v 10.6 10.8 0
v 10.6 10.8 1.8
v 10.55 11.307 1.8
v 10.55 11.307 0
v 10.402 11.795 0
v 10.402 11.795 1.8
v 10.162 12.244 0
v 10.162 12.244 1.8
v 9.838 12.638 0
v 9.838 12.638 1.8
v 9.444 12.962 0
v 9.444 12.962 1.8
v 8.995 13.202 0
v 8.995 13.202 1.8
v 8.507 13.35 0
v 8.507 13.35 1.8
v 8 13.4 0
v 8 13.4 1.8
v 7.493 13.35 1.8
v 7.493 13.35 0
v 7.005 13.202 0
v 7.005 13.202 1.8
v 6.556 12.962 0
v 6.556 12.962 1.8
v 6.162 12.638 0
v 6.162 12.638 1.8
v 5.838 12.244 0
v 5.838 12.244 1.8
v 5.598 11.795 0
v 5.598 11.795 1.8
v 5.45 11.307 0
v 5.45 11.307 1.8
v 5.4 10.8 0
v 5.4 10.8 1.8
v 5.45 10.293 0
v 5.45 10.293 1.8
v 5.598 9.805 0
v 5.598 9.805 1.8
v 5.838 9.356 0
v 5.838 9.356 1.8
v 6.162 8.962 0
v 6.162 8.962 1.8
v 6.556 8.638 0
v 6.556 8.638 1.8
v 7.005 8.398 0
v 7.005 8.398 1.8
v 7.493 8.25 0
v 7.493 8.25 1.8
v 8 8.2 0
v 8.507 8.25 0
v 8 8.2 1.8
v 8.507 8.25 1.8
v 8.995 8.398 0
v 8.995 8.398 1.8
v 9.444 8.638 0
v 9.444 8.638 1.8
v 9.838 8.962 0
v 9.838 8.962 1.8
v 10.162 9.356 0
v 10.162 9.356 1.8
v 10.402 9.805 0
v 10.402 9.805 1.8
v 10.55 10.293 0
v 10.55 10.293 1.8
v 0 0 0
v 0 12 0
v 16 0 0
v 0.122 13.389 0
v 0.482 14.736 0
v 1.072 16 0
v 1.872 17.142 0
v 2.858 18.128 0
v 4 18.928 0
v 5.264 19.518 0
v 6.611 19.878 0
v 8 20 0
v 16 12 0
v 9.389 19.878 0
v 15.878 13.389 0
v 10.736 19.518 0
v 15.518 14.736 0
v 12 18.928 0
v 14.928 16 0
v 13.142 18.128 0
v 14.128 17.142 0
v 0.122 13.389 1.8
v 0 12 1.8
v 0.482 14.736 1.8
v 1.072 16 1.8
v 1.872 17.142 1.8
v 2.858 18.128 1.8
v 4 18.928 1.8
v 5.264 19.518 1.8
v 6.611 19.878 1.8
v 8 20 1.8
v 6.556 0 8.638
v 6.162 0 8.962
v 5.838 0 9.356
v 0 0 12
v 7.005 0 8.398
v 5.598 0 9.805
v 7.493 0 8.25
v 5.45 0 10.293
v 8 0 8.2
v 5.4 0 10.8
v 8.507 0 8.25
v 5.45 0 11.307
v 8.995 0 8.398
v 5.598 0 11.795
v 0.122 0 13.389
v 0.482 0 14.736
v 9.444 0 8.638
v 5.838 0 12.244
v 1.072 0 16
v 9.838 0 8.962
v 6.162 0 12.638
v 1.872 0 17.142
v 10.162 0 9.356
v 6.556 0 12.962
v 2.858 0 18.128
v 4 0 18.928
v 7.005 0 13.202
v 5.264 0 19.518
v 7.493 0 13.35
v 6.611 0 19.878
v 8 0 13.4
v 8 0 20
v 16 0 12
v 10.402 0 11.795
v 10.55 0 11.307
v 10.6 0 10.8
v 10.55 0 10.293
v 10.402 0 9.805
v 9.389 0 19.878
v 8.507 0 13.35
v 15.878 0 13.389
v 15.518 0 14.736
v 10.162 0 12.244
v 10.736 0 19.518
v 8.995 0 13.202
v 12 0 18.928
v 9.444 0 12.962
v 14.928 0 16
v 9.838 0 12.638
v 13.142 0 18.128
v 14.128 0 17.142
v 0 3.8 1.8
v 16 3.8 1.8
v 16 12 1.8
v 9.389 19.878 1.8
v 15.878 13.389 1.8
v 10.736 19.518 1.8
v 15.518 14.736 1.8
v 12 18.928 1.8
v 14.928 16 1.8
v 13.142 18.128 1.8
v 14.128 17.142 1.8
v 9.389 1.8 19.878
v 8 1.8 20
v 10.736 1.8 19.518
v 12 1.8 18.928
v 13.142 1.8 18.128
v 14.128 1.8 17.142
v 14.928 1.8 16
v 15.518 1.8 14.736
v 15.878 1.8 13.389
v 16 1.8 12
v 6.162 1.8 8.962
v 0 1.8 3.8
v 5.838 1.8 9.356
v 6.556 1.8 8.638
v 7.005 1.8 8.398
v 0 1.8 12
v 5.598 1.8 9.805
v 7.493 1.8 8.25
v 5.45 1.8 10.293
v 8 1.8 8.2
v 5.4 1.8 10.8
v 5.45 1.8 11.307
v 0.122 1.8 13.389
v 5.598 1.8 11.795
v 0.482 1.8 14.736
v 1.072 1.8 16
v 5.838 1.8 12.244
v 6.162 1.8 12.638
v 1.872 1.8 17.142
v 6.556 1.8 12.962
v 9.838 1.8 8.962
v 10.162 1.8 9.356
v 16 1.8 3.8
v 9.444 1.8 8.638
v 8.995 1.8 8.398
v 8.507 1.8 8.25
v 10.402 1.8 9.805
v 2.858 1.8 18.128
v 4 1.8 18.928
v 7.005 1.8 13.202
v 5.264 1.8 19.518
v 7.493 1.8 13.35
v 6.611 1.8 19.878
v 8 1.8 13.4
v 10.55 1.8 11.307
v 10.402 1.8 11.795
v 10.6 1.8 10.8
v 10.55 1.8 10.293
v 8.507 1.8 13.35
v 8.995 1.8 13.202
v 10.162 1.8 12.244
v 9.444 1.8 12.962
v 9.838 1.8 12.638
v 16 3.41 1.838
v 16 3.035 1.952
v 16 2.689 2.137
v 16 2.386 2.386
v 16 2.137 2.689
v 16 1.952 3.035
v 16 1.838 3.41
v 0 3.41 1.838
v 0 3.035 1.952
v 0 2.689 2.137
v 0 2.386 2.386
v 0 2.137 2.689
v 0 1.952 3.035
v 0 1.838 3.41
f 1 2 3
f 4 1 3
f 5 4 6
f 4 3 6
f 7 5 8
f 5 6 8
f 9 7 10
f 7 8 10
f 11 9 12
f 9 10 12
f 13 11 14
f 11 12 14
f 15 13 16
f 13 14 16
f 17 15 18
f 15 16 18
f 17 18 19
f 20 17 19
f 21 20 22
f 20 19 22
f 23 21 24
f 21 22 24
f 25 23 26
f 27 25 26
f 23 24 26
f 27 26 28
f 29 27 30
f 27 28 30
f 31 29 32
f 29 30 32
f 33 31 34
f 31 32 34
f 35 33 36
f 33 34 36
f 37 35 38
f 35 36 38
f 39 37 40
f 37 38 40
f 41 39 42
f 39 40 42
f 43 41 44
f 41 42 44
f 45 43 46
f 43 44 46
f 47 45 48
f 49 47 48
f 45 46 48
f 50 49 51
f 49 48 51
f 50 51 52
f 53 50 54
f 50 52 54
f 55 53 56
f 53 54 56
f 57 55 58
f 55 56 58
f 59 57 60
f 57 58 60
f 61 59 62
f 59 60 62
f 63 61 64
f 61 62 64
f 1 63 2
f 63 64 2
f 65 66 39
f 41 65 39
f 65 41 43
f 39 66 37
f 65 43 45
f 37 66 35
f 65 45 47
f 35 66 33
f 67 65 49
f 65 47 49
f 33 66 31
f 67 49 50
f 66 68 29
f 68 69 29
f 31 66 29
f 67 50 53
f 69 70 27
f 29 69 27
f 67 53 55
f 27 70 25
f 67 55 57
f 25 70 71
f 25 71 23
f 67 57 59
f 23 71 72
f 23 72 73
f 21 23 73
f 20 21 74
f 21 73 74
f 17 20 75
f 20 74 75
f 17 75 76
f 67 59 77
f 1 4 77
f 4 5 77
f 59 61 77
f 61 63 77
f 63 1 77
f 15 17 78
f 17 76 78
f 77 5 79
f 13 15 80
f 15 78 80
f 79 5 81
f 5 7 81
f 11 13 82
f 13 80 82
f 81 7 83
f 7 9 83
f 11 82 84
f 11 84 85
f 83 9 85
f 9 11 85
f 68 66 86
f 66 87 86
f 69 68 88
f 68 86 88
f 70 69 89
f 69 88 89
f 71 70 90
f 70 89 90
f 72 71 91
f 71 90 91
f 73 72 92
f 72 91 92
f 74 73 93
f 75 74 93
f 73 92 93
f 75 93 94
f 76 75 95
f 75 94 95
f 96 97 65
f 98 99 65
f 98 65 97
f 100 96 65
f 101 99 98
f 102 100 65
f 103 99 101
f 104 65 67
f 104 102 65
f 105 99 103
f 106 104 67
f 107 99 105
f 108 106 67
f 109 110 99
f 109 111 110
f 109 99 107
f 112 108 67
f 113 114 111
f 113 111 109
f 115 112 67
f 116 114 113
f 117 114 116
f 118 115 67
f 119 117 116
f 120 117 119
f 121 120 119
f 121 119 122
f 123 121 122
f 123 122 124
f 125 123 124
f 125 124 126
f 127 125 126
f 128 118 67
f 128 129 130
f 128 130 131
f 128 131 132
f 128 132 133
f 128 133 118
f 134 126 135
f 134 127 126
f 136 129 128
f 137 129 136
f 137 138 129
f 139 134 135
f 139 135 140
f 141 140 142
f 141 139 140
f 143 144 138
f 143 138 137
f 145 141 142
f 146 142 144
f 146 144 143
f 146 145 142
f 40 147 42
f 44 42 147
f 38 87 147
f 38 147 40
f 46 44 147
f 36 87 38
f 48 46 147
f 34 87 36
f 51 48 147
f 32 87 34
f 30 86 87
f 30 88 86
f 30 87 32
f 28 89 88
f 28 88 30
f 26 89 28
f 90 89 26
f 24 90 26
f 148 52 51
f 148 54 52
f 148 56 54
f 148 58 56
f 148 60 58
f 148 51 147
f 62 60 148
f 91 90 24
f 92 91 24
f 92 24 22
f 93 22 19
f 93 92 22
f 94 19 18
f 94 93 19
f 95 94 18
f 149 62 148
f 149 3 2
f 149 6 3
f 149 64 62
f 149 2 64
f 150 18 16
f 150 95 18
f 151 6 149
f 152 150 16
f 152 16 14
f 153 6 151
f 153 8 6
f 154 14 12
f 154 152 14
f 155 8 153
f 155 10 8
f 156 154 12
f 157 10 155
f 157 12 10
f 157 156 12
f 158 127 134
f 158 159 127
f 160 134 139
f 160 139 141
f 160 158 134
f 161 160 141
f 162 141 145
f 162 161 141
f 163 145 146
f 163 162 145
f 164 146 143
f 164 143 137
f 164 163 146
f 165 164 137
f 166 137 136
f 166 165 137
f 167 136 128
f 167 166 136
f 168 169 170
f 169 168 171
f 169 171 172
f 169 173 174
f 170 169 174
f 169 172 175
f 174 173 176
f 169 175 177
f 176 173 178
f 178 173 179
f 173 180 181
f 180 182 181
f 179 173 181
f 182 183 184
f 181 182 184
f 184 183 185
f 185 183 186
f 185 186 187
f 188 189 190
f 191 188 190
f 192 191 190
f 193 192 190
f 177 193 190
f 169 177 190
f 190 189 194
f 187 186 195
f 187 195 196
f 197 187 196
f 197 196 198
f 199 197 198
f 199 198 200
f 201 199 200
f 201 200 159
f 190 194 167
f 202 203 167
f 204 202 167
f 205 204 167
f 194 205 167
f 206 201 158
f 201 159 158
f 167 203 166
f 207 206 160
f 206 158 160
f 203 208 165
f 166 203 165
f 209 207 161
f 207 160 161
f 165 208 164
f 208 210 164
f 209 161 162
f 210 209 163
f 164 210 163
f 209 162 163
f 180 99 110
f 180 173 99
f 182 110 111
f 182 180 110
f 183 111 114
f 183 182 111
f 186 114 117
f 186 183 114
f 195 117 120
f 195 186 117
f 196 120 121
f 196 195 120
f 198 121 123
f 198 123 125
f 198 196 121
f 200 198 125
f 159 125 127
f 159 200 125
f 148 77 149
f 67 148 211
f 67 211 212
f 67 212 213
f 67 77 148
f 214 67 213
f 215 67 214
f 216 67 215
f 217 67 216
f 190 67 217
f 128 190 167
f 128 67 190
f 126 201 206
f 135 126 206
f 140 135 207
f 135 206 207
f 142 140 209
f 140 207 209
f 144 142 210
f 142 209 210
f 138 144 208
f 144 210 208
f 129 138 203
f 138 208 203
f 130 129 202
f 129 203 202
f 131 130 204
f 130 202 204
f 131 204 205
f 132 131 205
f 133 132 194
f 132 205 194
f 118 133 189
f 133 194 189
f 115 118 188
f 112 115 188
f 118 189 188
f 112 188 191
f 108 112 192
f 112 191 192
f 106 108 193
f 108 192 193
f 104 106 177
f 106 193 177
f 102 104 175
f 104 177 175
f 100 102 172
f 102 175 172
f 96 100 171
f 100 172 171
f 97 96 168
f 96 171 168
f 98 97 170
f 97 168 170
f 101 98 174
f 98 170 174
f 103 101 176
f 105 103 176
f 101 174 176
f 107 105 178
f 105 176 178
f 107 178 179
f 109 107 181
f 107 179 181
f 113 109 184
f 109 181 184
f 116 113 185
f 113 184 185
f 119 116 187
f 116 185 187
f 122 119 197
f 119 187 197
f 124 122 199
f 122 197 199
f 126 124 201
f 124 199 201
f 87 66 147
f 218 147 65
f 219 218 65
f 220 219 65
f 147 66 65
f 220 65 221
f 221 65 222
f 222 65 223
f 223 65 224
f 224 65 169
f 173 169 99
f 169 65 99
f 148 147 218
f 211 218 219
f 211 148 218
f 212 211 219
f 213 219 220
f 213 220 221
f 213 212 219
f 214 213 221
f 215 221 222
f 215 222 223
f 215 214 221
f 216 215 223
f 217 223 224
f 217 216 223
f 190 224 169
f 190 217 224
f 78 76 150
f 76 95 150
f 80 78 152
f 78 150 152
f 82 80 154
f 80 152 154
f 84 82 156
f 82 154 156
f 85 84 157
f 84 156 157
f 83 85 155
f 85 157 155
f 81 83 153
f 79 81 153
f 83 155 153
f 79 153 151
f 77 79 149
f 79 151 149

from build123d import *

# Parameters (mm, degrees)
SKETCH1_W           = 16
SKETCH1_H           = 20
BOSS_EXTRUDE1_DEPTH = 1.8
SKETCH2_W           = 16
SKETCH2_H           = 18.2
BOSS_EXTRUDE2_DEPTH = 1.8
SKETCH3_R           = 2.6
CUT_EXTRUDE1_DEPTH  = 1.8
SKETCH4_R           = 2.6
CUT_EXTRUDE2_DEPTH  = 1.8
FILLET1_R           = 2
FILLET2_R           = 8


with BuildPart() as part:
    # Sketch1 → Boss-Extrude1 (new body)
    with BuildSketch(Plane.XY):
        with Locations((8, 10)):
            Rectangle(SKETCH1_W, SKETCH1_H)
    extrude(amount=BOSS_EXTRUDE1_DEPTH)

    # Sketch2 → Boss-Extrude2 (add)
    with BuildSketch(Plane.XZ):
        with Locations((8, 10.9)):
            Rectangle(SKETCH2_W, SKETCH2_H)
    extrude(amount=-BOSS_EXTRUDE2_DEPTH)

    # Sketch3 → Cut-Extrude1 (cut)
    with BuildSketch(Plane.XY.offset(1.8)):
        with Locations((8, 10.8)):
            Circle(SKETCH3_R)
    extrude(amount=-CUT_EXTRUDE1_DEPTH, mode=Mode.SUBTRACT)

    # Sketch4 → Cut-Extrude2 (cut)
    with BuildSketch(Plane(origin=(0, 1.8, 0), x_dir=(1, 0, 0), z_dir=(0, 1, 0))):
        with Locations(Location((8, -10.8, 0), (0, 0, 270))):
            Circle(SKETCH4_R)
    extrude(amount=-CUT_EXTRUDE2_DEPTH, mode=Mode.SUBTRACT)

    # Fillet1
    fillet1_edges = [part.edges().sort_by_distance(p)[0] for p in [
        (8, 1.8, 1.8),
    ]]
    fillet(fillet1_edges, radius=FILLET1_R)

    # Fillet2
    fillet2_edges = [part.edges().sort_by_distance(p)[0] for p in [
        (16, 0.9, 20),
        (0, 0.9, 20),
        (16, 20, 0.9),
        (0, 20, 0.9),
    ]]
    fillet(fillet2_edges, radius=FILLET2_R - 0.0001)  # a hair under: the kernel refuses the full size


solid = part.part
